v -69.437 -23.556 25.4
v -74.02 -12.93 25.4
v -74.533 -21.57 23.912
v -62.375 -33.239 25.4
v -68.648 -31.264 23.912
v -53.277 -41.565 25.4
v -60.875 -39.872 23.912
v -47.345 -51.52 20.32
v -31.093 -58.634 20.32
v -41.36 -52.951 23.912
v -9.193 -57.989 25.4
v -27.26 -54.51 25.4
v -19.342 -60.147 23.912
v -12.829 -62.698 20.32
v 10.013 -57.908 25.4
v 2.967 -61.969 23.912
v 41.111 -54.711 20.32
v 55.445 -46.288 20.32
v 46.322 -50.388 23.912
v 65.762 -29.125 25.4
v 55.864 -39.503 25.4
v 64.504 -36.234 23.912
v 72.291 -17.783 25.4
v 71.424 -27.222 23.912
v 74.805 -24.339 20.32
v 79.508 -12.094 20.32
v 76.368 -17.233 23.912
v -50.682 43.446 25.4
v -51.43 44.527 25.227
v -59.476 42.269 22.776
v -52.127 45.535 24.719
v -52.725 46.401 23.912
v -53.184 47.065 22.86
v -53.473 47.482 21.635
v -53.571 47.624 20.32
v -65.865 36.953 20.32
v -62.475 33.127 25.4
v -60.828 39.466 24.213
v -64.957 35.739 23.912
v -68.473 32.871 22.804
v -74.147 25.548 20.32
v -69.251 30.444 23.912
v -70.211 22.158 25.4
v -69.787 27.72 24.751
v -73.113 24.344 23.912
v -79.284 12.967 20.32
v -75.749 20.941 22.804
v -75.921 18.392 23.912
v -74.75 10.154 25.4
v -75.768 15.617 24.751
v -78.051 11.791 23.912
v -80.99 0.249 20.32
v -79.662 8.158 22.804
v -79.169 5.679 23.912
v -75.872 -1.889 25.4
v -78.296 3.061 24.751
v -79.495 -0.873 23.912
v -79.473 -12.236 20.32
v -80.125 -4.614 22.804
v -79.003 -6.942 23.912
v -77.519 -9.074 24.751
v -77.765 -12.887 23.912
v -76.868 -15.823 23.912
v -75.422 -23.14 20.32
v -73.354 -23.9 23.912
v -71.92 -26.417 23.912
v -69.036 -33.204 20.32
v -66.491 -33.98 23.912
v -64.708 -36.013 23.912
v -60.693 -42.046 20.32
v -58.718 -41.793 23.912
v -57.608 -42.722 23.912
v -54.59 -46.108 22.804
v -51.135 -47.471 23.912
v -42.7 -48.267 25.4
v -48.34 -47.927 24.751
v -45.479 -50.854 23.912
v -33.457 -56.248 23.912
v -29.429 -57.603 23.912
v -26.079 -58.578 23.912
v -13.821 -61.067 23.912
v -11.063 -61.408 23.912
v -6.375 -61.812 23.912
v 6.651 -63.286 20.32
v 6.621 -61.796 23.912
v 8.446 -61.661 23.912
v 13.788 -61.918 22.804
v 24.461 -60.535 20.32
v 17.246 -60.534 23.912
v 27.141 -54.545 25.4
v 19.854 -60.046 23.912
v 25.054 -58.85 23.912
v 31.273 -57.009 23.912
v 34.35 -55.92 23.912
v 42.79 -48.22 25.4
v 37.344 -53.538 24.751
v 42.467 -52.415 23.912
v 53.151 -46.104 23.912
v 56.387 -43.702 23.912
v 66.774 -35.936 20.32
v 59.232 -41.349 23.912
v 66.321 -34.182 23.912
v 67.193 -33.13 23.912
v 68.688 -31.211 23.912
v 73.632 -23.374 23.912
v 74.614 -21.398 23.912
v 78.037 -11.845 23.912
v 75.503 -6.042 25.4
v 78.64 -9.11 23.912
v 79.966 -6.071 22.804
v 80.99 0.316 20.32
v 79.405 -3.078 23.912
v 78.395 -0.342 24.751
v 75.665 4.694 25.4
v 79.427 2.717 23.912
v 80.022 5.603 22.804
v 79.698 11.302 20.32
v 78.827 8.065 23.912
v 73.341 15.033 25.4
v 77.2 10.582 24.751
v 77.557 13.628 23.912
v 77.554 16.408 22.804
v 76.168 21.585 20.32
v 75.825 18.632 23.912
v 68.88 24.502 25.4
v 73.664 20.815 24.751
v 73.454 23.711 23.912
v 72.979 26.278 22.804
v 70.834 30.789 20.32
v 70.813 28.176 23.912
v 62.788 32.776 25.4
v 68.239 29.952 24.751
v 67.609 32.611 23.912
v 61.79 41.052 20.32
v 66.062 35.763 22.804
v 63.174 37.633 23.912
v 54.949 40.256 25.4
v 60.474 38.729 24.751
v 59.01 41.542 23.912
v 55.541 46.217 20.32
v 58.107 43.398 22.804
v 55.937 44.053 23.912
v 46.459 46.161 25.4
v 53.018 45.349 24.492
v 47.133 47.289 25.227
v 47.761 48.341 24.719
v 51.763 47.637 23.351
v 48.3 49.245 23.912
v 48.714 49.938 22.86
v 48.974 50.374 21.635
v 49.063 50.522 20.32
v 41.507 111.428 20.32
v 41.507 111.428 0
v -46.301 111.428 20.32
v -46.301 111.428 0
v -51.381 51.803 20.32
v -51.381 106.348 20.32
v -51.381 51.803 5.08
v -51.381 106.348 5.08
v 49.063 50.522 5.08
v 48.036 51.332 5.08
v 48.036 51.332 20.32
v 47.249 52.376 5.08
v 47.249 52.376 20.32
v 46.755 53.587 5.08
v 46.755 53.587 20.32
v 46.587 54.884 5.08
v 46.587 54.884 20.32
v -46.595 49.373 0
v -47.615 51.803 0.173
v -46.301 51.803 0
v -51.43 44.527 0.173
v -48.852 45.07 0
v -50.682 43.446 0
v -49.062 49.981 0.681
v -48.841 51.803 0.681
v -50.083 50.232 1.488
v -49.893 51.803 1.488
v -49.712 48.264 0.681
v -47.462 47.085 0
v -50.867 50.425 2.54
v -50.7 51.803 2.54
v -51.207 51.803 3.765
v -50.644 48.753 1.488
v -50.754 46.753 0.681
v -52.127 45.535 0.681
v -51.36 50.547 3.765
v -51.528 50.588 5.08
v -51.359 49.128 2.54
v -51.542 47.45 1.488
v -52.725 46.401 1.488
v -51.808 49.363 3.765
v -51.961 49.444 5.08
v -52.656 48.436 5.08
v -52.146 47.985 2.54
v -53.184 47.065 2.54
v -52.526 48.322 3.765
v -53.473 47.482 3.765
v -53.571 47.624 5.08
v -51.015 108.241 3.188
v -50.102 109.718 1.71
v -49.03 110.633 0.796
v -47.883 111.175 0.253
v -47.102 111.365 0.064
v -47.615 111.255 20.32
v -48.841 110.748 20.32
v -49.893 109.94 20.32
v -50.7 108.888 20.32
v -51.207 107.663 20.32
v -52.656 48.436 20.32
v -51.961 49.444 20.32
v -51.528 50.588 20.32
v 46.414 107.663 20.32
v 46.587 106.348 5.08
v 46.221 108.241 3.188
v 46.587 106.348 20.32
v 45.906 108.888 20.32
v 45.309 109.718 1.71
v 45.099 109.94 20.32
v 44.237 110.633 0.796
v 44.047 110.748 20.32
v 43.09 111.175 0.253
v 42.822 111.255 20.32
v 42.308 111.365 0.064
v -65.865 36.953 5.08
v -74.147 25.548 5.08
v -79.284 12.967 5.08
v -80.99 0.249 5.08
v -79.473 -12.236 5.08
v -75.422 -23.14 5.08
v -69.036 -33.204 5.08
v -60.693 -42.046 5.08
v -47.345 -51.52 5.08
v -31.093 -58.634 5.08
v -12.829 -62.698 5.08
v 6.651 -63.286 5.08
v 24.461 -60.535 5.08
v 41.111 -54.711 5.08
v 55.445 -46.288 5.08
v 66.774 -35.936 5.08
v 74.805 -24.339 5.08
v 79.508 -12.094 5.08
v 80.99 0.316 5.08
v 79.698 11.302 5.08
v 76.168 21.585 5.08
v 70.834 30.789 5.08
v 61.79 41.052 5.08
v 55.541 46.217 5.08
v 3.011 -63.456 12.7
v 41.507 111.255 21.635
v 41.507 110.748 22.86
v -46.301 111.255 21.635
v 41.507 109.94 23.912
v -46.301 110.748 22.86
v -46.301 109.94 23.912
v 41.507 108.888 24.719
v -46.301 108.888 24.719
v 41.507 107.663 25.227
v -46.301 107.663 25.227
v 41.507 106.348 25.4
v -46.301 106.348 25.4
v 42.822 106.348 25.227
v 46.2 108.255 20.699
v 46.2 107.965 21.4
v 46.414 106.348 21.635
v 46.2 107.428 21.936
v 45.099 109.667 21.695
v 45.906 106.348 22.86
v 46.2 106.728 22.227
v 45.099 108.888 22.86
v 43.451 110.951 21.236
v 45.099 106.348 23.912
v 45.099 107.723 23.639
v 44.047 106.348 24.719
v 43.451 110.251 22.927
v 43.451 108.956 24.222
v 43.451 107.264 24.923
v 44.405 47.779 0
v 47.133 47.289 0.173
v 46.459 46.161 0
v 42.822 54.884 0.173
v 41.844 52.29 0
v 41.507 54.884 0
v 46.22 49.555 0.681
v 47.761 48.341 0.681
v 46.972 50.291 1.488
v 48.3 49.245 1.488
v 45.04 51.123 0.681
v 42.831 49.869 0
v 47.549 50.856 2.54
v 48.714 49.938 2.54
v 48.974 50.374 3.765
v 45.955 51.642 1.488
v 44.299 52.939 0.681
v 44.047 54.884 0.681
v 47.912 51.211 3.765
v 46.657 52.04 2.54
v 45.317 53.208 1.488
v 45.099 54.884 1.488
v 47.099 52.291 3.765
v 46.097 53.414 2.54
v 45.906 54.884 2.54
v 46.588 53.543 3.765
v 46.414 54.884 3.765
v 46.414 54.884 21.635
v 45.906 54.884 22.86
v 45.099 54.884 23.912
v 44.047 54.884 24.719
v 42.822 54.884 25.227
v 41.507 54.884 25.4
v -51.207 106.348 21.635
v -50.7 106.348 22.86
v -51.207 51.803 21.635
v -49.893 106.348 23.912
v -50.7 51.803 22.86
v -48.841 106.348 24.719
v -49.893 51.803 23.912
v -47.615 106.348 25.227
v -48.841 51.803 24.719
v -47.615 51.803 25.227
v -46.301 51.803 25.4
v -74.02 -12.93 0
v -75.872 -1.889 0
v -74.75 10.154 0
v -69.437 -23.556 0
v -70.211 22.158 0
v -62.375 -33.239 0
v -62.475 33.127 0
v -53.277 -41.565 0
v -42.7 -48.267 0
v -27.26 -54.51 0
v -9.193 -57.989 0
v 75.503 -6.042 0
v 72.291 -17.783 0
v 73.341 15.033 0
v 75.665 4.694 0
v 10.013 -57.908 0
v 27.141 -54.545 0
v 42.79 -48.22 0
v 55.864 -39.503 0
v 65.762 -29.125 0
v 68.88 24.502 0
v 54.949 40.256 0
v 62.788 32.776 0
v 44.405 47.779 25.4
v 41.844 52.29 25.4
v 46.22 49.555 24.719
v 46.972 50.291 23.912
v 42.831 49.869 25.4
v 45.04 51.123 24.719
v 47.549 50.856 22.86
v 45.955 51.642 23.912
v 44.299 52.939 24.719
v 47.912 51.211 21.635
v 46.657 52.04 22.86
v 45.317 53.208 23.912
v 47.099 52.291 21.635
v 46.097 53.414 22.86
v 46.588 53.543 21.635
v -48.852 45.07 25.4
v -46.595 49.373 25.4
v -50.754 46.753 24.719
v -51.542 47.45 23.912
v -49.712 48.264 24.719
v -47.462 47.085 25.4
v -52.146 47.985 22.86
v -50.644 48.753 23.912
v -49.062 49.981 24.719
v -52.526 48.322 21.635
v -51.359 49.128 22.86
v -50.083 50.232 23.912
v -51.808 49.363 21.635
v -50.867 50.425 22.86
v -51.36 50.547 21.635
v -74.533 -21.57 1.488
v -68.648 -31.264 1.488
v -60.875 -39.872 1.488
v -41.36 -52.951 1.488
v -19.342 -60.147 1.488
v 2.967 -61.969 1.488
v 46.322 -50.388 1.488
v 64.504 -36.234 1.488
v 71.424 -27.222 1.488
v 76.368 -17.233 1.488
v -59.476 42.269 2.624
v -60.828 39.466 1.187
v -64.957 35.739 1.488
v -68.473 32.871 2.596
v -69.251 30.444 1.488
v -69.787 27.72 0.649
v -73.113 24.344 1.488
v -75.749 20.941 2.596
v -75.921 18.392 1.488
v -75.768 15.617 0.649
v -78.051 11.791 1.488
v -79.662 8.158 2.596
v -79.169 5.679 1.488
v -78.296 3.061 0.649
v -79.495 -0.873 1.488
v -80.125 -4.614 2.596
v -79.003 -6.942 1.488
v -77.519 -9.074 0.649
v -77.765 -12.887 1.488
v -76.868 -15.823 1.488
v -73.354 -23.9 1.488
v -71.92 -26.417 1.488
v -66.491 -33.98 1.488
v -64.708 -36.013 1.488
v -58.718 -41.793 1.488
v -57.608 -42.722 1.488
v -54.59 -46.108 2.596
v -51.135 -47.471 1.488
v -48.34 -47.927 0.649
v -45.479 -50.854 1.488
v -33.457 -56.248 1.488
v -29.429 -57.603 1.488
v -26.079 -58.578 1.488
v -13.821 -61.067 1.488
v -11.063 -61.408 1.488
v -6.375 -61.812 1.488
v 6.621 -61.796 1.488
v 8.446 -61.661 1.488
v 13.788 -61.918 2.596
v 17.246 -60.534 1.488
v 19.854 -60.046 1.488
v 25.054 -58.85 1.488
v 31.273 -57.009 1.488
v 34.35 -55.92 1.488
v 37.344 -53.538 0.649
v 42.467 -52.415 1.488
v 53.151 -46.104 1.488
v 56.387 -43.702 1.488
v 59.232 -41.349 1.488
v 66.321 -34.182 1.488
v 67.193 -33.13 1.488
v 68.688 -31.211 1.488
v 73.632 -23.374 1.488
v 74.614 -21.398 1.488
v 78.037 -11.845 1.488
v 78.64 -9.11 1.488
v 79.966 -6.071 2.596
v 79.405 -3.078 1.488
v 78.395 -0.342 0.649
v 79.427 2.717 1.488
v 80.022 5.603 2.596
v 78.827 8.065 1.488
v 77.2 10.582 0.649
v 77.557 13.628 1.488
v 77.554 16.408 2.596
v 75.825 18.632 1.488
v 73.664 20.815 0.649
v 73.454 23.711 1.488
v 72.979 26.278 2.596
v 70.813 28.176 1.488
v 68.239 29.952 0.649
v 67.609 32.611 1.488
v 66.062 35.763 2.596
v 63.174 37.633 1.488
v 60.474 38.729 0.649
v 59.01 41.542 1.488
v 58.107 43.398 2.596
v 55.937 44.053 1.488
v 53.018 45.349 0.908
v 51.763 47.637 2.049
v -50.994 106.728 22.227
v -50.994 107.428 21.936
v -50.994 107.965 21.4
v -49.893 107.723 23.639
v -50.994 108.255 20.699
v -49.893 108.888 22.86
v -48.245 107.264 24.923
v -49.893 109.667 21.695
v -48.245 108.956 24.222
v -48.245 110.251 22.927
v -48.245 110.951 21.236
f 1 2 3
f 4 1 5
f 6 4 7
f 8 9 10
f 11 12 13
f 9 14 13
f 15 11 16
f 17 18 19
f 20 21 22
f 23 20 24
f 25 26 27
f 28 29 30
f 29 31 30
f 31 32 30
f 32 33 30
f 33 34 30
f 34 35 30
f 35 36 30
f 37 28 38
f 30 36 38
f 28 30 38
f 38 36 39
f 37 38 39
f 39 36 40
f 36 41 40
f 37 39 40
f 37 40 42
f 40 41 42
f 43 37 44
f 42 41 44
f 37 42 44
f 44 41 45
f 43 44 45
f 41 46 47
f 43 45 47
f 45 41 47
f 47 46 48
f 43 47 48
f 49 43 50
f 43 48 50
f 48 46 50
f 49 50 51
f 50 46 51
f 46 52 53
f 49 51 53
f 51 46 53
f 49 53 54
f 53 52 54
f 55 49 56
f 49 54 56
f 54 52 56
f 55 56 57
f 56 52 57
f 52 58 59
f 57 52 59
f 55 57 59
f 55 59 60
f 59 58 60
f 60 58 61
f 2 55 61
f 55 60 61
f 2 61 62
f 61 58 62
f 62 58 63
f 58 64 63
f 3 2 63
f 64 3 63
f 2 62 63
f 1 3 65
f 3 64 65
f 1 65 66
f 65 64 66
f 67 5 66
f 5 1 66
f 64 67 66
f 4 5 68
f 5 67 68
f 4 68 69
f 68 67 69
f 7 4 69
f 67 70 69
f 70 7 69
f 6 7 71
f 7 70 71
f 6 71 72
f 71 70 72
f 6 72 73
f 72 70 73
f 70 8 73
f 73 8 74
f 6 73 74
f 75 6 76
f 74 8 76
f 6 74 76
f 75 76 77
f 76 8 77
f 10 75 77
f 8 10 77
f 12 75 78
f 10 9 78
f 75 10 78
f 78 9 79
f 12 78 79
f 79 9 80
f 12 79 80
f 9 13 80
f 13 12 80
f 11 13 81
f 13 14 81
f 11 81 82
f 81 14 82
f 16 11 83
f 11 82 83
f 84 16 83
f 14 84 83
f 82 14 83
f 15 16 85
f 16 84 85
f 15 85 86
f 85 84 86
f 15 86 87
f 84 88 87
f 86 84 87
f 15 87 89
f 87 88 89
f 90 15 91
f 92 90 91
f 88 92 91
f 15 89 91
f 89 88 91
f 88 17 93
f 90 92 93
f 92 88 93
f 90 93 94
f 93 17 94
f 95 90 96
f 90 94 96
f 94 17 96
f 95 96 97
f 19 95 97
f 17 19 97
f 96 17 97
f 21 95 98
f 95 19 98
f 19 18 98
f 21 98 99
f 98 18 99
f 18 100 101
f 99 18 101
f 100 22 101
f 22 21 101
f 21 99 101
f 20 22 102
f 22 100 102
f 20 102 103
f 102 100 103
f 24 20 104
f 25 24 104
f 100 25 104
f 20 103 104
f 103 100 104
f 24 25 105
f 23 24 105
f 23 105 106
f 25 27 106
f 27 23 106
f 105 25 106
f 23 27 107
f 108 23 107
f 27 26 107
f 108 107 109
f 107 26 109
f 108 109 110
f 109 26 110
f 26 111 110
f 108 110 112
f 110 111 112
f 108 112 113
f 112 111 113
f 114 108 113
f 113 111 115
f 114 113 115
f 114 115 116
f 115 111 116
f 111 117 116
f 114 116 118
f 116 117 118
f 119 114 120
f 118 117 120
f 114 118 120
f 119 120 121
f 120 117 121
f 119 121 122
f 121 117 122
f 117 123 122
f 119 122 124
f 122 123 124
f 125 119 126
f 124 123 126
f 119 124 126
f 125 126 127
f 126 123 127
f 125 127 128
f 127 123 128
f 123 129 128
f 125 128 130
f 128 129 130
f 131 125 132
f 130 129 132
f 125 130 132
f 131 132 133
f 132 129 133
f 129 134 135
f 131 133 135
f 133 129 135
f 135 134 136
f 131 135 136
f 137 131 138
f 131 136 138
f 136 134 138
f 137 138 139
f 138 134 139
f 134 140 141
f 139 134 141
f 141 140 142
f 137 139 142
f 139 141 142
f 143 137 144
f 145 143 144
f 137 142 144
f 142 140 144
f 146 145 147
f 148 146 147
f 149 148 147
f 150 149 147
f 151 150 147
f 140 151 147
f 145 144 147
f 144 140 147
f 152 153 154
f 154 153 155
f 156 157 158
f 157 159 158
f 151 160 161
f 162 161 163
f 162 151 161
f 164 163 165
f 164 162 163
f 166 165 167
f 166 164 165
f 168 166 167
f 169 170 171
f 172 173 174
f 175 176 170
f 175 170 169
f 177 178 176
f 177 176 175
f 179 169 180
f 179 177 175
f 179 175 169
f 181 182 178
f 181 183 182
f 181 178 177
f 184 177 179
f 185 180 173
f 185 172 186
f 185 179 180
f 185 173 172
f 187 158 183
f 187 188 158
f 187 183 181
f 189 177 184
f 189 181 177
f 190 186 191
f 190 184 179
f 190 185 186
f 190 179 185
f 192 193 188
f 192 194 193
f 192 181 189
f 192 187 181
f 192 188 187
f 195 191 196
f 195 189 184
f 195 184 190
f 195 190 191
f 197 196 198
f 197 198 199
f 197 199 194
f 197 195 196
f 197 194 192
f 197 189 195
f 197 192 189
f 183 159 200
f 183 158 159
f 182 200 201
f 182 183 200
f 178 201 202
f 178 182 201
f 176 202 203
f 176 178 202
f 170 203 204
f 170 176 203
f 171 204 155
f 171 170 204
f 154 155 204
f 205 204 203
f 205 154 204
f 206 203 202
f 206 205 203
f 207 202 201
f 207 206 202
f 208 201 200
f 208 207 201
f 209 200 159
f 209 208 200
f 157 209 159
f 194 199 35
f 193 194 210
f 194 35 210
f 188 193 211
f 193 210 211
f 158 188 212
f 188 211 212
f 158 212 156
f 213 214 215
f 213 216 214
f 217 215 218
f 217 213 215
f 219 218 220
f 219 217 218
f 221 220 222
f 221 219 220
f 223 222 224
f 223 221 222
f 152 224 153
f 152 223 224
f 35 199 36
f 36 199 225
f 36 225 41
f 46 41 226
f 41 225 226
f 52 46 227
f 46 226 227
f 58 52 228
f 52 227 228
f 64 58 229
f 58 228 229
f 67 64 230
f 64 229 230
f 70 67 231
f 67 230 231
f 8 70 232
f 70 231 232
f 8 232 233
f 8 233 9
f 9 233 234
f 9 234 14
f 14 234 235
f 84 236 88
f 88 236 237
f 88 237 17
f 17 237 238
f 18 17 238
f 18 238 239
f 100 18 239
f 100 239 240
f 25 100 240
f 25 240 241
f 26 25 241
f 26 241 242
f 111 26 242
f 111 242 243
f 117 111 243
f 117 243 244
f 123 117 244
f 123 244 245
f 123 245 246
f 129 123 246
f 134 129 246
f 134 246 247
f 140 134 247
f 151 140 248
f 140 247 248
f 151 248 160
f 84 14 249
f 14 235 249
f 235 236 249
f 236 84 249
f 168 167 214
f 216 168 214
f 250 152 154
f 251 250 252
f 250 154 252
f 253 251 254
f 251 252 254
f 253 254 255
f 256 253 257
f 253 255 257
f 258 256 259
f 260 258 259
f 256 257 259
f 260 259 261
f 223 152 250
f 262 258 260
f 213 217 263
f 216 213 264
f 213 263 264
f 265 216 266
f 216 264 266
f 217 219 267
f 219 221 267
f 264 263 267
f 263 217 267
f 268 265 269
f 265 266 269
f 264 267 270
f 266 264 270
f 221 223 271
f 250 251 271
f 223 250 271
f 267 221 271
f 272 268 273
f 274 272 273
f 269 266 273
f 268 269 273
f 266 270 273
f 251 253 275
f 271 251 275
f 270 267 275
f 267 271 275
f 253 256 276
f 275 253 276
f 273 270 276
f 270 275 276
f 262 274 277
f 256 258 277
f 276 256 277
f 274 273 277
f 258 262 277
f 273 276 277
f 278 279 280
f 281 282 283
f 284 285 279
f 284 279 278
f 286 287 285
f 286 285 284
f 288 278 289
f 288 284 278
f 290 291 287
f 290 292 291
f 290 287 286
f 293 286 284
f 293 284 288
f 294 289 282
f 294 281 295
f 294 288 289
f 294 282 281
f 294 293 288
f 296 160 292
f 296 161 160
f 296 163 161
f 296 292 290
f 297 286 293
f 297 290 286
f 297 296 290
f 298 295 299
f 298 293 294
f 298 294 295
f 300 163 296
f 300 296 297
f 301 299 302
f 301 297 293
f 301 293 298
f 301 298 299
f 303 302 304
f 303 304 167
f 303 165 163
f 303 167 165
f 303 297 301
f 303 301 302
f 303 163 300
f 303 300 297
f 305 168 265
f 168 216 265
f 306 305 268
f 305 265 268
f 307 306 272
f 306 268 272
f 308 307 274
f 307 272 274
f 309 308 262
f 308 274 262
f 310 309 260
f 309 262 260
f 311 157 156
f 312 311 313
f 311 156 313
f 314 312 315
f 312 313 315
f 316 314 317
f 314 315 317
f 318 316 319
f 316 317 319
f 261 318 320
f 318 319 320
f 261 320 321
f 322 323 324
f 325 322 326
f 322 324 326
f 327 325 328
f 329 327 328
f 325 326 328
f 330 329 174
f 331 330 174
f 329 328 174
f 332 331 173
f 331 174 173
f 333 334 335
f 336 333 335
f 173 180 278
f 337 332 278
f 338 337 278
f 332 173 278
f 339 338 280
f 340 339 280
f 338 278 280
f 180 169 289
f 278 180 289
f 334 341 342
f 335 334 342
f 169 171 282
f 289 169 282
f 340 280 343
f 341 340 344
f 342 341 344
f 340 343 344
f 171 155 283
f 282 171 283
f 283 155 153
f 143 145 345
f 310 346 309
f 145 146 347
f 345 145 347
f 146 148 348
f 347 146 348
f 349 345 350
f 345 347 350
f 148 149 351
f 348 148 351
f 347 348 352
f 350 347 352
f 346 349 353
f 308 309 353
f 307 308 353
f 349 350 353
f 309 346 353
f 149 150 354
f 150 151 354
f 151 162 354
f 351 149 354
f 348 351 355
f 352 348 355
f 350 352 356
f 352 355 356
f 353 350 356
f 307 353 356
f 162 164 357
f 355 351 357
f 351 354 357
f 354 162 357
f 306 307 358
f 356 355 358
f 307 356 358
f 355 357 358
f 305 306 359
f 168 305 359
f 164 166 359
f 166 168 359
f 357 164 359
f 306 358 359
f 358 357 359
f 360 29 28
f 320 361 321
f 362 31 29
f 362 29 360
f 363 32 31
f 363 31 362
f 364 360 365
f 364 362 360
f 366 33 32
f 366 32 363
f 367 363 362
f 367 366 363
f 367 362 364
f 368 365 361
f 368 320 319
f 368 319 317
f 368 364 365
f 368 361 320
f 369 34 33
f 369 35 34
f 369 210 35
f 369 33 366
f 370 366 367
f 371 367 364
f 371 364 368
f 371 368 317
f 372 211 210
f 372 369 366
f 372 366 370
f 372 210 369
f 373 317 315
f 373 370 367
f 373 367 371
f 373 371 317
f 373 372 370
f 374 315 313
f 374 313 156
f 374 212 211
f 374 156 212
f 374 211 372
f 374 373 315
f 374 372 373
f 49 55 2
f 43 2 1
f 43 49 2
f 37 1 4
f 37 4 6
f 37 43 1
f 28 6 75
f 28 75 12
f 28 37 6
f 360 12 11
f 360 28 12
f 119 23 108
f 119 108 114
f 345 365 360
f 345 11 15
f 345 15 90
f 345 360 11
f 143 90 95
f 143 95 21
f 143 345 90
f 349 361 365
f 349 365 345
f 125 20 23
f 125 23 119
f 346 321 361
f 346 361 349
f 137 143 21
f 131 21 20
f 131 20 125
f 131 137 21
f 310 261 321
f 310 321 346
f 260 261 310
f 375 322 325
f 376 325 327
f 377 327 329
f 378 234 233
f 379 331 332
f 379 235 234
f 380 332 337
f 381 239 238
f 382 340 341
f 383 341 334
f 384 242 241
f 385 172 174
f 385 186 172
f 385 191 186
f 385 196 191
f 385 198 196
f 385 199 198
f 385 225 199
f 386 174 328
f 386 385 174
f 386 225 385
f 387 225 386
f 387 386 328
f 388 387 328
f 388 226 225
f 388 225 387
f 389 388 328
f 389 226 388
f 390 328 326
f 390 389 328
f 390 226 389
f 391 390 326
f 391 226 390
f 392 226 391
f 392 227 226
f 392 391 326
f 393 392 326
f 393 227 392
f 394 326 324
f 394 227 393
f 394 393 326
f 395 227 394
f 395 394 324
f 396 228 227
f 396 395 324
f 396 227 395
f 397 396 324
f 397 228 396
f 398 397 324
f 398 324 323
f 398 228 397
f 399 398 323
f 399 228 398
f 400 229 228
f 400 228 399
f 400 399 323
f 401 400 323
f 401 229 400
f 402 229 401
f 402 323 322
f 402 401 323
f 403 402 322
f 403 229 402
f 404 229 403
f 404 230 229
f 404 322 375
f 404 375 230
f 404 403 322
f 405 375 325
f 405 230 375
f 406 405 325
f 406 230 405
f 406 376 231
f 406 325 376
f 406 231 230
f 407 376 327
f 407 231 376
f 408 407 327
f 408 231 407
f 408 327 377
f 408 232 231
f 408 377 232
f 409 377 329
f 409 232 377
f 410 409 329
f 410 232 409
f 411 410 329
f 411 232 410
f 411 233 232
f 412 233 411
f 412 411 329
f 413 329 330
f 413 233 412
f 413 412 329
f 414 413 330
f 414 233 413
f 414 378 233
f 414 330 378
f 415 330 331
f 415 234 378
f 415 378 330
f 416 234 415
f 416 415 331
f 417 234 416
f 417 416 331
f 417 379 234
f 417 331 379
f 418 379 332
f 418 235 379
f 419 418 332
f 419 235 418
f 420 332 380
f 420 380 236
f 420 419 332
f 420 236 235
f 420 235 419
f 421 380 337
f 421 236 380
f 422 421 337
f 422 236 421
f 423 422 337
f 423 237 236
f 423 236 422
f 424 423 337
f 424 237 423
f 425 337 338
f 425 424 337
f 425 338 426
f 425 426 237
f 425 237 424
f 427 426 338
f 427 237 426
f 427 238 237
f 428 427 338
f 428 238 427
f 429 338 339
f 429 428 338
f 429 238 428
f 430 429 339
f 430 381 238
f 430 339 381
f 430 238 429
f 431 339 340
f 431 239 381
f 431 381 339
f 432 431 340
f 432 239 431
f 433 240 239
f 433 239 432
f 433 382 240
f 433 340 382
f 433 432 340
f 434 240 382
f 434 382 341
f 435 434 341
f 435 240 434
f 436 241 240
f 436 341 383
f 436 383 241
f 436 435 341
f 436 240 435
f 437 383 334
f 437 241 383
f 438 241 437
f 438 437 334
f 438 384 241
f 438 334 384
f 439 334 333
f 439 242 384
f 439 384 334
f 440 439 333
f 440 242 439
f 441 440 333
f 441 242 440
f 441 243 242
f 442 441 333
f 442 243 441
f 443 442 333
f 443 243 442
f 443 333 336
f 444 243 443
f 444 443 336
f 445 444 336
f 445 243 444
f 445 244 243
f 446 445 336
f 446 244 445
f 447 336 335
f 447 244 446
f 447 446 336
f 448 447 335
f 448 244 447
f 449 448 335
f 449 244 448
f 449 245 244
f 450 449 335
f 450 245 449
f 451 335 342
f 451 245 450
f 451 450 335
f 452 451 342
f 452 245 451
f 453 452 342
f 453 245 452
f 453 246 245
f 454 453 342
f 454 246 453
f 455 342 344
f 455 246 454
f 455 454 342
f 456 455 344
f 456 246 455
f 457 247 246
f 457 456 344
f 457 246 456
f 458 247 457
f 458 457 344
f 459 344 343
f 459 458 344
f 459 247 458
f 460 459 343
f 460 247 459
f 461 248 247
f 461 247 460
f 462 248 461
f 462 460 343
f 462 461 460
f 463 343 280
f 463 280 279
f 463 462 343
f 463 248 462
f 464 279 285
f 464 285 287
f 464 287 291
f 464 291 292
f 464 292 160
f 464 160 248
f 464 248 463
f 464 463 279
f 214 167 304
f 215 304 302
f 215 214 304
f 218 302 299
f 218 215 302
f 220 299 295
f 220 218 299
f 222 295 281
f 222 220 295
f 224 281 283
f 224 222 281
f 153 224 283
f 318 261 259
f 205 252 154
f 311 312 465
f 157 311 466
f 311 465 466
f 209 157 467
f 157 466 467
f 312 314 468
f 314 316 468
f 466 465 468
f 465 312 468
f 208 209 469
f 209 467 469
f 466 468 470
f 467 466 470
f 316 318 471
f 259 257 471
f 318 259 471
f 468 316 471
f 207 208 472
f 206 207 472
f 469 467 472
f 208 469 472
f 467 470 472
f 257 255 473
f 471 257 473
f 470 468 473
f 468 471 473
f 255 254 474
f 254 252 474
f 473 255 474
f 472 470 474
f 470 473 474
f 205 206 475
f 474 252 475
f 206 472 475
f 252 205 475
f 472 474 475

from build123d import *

# Parameters (mm, degrees)
F1_DEPTH = 25.4
F2_R     = 5.08


with BuildPart() as f1:
    # F0 (on Top) → F1 (new body)
    with BuildSketch(Plane.XY):
        with BuildLine():
            add(Edge.make_bspline(
                [(46.586951, 51.943274), (25.625325, 63.5), (0, 63.5)],
                knots=[4.099526, 4.099526, 4.099526, 4.712389, 4.712389, 4.712389], degree=2, weights=[1, 0.953416, 1]))
            add(Edge.make_bspline(
                [(0, 63.5), (-28.979378, 63.5), (-51.380593, 49.085841)],
                knots=[4.712389, 4.712389, 4.712389, 5.39962, 5.39962, 5.39962], degree=2, weights=[1, 0.941543, 1]))
            add(Edge.make_bspline(
                [(-51.380593, 49.085841), (-237.17055, -70.461512), (3.010873, -63.456106), (243.192296, -56.4507), (46.586951, 51.943274)],
                knots=[5.39962, 5.39962, 5.39962, 7.891166, 7.891166, 10.382711, 10.382711, 10.382711], degree=2, weights=[1, 0.319331, 1, 0.319331, 1]))
        make_face()
        with BuildLine():
            add(Edge.make_bspline(
                [(0, 63.5), (-28.979378, 63.5), (-51.380593, 49.085841)],
                knots=[4.712389, 4.712389, 4.712389, 5.39962, 5.39962, 5.39962], degree=2, weights=[1, 0.941543, 1]))
            add(Edge.make_bspline(
                [(46.586951, 51.943274), (25.625325, 63.5), (0, 63.5)],
                knots=[4.099526, 4.099526, 4.099526, 4.712389, 4.712389, 4.712389], degree=2, weights=[1, 0.953416, 1]))
            Line((46.586951, 51.943274), (46.586951, 111.428356))
            Line((46.586951, 111.428356), (-51.380593, 111.428356))
            Line((-51.380593, 111.428356), (-51.380593, 49.085841))
        make_face()
    extrude(amount=F1_DEPTH)

    # F2
    f2_edges = [f1.edges().sort_by_distance(p)[0] for p in [
        (2.790522, -63.462297, 0),
        (2.790522, -63.462297, 25.4),
        (46.586951, 81.685815, 0),
        (-2.396821, 111.428356, 25.4),
        (46.586951, 111.428356, 12.7),
        (-51.380593, 80.257099, 25.4),
        (46.586951, 81.685815, 25.4),
        (-51.380593, 49.085841, 12.7),
        (-51.380593, 80.257099, 0),
        (-51.380593, 111.428356, 12.7),
        (46.586951, 51.943274, 12.7),
    ]]
    fillet(f2_edges, radius=F2_R)


solid = f1.part
